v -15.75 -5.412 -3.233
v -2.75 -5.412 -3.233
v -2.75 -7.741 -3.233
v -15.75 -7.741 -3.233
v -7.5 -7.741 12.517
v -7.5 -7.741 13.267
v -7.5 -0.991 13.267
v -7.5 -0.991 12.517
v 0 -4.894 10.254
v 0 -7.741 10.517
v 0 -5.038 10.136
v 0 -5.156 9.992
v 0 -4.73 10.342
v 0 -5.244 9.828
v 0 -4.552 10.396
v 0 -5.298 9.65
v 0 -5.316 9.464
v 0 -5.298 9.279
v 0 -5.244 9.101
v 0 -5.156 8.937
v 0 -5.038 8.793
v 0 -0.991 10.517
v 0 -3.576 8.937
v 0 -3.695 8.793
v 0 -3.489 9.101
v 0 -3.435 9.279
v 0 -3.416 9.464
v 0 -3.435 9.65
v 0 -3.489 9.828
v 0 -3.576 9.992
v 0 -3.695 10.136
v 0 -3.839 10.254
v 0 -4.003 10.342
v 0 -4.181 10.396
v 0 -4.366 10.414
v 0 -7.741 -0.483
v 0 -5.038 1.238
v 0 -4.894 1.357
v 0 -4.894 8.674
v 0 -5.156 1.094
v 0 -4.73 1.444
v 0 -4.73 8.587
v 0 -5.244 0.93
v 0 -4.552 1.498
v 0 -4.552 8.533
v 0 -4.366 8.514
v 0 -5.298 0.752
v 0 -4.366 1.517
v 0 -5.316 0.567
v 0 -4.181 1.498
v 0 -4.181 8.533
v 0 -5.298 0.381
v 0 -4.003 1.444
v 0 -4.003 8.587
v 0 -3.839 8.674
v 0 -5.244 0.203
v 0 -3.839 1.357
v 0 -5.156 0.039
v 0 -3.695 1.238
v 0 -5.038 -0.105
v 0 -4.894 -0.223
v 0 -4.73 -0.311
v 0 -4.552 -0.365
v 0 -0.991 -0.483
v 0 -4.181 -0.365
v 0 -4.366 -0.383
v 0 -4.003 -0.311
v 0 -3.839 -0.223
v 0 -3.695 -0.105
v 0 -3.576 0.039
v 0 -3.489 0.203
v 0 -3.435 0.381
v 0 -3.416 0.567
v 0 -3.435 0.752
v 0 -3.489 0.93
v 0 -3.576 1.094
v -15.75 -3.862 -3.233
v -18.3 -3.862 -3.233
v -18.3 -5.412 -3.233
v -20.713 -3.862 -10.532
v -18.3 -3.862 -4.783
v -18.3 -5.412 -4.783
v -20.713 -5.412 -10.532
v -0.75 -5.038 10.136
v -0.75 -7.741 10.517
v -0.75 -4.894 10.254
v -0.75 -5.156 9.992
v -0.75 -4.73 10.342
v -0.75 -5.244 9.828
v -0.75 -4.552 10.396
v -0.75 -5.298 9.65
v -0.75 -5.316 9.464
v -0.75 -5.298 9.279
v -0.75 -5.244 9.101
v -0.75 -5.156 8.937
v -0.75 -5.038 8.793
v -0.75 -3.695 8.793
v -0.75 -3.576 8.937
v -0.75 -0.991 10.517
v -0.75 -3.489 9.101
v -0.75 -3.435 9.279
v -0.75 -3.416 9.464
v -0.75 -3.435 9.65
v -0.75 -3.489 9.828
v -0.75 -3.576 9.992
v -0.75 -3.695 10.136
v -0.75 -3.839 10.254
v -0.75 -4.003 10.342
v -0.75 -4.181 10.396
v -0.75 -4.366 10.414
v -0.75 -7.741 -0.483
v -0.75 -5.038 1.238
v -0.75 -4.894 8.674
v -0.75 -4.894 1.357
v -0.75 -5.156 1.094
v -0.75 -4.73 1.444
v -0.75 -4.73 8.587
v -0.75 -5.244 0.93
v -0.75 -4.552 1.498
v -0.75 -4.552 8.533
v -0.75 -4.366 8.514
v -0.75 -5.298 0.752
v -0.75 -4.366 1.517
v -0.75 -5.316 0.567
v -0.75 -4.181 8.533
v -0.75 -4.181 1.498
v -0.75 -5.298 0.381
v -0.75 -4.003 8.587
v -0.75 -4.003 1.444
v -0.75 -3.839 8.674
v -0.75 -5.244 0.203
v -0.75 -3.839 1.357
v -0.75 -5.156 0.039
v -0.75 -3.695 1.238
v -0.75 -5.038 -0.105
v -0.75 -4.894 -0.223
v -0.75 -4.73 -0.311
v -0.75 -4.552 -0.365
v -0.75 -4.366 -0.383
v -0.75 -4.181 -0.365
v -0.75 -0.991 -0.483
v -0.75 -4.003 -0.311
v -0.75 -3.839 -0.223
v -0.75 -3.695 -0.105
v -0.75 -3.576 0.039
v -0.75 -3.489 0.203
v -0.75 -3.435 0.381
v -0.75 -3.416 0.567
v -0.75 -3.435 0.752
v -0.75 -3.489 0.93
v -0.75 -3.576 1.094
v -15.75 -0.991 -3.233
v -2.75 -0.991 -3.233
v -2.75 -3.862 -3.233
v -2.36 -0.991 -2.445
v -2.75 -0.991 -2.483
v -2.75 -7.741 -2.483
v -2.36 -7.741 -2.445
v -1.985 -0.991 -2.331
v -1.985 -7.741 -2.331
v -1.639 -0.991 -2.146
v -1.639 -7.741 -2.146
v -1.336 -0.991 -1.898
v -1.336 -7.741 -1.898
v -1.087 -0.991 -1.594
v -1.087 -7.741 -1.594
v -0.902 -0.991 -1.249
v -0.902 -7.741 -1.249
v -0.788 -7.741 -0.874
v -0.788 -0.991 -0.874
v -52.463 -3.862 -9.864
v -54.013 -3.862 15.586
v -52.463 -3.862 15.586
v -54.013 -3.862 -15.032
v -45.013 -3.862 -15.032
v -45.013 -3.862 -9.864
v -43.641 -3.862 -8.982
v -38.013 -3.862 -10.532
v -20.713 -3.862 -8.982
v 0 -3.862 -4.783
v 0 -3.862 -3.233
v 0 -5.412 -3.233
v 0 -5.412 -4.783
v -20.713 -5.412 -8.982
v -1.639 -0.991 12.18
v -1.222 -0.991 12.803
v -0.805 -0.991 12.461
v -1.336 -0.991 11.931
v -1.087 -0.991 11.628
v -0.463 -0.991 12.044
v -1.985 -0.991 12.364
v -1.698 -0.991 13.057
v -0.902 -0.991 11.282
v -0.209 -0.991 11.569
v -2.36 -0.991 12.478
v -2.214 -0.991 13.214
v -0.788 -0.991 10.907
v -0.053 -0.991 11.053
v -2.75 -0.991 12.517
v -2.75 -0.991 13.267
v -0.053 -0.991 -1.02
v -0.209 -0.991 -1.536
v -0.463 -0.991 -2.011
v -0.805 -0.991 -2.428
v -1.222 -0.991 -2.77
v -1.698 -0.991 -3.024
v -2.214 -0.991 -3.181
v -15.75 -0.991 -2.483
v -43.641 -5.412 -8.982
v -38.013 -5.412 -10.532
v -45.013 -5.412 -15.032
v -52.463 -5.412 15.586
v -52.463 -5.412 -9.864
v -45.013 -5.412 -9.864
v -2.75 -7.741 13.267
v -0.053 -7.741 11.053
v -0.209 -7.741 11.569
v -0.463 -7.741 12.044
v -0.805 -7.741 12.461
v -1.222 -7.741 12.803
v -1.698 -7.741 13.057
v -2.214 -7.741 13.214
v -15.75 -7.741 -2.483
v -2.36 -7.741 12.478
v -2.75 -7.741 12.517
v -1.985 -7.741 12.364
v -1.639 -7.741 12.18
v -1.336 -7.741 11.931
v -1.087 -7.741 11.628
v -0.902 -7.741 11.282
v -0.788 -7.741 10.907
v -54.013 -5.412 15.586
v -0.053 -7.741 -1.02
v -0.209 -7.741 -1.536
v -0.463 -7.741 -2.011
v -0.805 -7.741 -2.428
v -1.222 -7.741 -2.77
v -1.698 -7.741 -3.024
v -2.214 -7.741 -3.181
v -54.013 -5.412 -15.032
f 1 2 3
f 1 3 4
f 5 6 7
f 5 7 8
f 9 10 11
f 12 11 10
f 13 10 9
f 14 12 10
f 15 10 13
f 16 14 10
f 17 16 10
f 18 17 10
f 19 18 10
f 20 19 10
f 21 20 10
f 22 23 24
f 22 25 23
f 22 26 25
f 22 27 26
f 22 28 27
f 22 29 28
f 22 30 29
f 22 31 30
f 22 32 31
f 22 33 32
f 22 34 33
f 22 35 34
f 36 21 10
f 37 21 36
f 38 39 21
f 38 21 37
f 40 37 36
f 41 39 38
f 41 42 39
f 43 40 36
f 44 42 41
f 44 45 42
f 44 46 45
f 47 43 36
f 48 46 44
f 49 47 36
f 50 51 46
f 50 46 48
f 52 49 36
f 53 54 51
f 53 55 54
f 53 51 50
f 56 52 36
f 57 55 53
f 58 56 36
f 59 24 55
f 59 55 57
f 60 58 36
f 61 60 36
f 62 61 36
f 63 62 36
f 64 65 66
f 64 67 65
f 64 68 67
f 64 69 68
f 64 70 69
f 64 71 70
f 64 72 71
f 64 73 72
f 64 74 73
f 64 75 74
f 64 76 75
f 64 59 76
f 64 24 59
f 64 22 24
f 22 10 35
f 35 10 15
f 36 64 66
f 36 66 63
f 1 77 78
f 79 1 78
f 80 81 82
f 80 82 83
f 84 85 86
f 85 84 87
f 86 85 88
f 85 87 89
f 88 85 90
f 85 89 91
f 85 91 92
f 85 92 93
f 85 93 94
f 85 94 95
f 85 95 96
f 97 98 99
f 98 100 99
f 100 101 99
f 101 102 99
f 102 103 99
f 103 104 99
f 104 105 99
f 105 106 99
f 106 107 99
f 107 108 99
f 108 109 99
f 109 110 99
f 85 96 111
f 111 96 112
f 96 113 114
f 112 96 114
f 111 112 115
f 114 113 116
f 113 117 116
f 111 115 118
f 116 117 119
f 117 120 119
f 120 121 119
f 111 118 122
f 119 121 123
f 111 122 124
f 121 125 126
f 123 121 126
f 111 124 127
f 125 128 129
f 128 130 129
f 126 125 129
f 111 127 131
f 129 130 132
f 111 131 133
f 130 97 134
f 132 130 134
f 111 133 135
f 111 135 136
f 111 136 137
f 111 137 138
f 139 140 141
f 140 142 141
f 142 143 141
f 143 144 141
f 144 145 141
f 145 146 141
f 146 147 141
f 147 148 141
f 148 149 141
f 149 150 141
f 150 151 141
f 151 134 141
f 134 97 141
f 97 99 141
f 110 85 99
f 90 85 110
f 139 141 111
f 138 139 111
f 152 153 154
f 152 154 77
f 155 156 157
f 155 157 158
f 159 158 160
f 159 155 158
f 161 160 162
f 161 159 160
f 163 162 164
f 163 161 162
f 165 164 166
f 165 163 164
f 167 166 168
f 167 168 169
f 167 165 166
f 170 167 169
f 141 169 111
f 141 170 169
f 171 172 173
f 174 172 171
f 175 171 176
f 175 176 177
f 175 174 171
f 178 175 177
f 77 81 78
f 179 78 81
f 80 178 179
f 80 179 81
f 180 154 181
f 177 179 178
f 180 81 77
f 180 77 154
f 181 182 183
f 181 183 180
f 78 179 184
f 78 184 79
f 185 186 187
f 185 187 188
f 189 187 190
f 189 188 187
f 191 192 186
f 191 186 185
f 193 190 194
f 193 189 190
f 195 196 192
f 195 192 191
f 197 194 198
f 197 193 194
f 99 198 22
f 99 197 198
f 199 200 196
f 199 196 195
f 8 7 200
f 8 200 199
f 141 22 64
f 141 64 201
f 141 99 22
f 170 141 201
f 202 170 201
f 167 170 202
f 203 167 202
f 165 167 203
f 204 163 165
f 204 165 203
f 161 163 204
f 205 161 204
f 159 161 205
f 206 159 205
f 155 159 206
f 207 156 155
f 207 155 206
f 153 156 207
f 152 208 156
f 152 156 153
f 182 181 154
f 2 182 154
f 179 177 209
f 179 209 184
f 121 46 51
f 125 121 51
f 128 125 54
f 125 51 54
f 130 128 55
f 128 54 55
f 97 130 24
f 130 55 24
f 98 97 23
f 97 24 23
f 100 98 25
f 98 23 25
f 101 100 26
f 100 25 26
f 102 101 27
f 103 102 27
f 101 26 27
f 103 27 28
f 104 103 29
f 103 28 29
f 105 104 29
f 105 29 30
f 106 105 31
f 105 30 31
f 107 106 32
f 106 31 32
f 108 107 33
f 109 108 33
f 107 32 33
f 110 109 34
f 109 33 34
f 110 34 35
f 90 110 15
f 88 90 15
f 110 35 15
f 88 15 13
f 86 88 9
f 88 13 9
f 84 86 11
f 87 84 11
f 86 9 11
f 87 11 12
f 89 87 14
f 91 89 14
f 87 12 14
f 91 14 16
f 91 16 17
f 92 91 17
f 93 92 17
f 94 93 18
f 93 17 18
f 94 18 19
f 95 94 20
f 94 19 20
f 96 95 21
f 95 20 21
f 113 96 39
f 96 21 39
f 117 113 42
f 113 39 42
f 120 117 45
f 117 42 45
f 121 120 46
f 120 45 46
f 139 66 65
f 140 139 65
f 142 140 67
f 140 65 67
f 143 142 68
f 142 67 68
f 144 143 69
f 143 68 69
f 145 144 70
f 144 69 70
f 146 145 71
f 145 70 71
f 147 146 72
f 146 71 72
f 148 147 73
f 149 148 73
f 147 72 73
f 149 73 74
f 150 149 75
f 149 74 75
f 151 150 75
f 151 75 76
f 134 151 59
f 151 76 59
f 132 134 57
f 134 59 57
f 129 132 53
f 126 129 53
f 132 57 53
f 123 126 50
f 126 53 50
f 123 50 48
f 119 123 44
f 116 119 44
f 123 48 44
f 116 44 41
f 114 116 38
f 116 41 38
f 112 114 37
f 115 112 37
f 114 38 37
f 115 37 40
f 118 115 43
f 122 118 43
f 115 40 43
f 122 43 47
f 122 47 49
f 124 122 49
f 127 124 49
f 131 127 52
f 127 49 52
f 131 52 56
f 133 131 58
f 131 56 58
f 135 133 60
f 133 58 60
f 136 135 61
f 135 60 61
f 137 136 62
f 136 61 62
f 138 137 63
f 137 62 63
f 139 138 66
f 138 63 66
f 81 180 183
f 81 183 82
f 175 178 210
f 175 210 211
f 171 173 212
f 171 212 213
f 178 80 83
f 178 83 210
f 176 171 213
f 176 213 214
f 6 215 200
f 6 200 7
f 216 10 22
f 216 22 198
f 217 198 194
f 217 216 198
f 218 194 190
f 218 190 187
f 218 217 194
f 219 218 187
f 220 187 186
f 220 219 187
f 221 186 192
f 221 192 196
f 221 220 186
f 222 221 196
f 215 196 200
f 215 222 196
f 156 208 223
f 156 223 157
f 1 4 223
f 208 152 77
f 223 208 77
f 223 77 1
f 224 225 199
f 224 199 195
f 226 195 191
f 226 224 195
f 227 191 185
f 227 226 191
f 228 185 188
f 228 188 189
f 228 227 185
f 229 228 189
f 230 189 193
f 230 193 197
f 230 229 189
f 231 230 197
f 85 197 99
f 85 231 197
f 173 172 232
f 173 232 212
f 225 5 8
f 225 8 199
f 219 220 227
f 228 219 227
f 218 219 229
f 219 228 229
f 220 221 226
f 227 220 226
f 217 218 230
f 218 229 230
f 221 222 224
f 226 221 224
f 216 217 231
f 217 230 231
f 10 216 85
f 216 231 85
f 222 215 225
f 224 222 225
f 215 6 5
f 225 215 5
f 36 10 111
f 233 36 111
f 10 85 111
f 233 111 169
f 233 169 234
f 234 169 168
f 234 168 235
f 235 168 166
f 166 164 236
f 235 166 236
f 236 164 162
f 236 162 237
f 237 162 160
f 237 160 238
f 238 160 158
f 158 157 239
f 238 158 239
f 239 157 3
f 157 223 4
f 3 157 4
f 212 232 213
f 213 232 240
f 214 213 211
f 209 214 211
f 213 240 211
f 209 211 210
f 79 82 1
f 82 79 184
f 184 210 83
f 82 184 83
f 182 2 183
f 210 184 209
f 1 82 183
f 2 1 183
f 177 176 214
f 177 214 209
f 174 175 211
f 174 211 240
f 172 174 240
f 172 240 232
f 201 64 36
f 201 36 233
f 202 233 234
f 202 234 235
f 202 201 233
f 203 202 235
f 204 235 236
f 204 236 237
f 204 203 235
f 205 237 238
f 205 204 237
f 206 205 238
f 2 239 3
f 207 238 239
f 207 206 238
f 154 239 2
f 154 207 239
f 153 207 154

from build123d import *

# Parameters (mm, degrees)
SZKIC2_W                           = 16.5
SZKIC2_H                           = 6.75
ODGI_CIE_BAZOWE1_DEPTH             = 0.75
ODGI_CIE_KRAW_DZI1_STRIP_W         = 7
ODGI_CIE_KRAW_DZI1_STRIP_H         = 0.75
ODGI_CIE_KRAW_DZI1_STRIP_CUT_DEPTH = 6.75
ODGI_CIE_KRAW_DZI1_DEPTH           = 6.75
ODGI_CIE_KRAW_DZI2_STRIP_W         = 7
ODGI_CIE_KRAW_DZI2_STRIP_H         = 0.75
ODGI_CIE_KRAW_DZI2_STRIP_CUT_DEPTH = 6.75
ODGI_CIE_KRAW_DZI2_DEPTH           = 6.75
SZKIC16_W                          = 18.3
SZKIC16_H                          = 1.55
DODANIE_WYCI_GNI_CIE2_DEPTH        = 1.55
DODANIE_WYCI_GNI_CIE3_DEPTH        = 1.55
SZKIC19_R                          = 0.95
WYTNIJ_WYCI_GNI_CIE1_DEPTH         = 0.75


# Sheet-metal steps are written as plain solids
with BuildPart() as part:
    # Szkic2 → Odgięcie bazowe1 (new body)
    with BuildSketch(Plane(origin=(0, 0, 0), x_dir=(0, 0, -1), z_dir=(1, 0, 0))):
        with Locations((-5.0166528, -4.366319951)):
            Rectangle(SZKIC2_W, SZKIC2_H)
    extrude(amount=-ODGI_CIE_BAZOWE1_DEPTH)

    # Odgięcie krawędzi1 strip (across the edge) → Odgięcie krawędzi1 strip cut (cut)
    with BuildSketch(Plane(origin=(-0.75, -7.741319951, 13.2666528), x_dir=(0, 0, -1), z_dir=(0, 1, 0))):
        with Locations((-0.75, -0.375)):
            Rectangle(ODGI_CIE_KRAW_DZI1_STRIP_W, ODGI_CIE_KRAW_DZI1_STRIP_H)
    extrude(amount=ODGI_CIE_KRAW_DZI1_STRIP_CUT_DEPTH, mode=Mode.SUBTRACT)

    # Odgięcie krawędzi1 section (across the edge) → Odgięcie krawędzi1 (add)
    with BuildSketch(Plane(origin=(-0.75, -7.741319951, 13.2666528), x_dir=(0, 0, -1), z_dir=(0, 1, 0))):
        with BuildLine():
            Line((0, 2), (0, 6.75))
            Line((0, 6.75), (0.75, 6.75))
            Line((0.75, 6.75), (0.75, 2))
            ThreePointArc((0.75, 2), (1.335786438, 0.585786438), (2.75, 0))
            Line((2.75, 0), (2.75, -0.75))
            ThreePointArc((2.75, -0.75), (0.805456352, 0.055456352), (0, 2))
        make_face()
    extrude(amount=ODGI_CIE_KRAW_DZI1_DEPTH)

    # Odgięcie krawędzi2 strip (across the edge) → Odgięcie krawędzi2 strip cut (cut)
    with BuildSketch(Plane(origin=(-0.75, -0.991319951, -3.2333472), x_dir=(0, 0, 1), z_dir=(0, -1, 0))):
        with Locations((-0.75, -0.375)):
            Rectangle(ODGI_CIE_KRAW_DZI2_STRIP_W, ODGI_CIE_KRAW_DZI2_STRIP_H)
    extrude(amount=ODGI_CIE_KRAW_DZI2_STRIP_CUT_DEPTH, mode=Mode.SUBTRACT)

    # Odgięcie krawędzi2 section (across the edge) → Odgięcie krawędzi2 (add)
    with BuildSketch(Plane(origin=(-0.75, -0.991319951, -3.2333472), x_dir=(0, 0, 1), z_dir=(0, -1, 0))):
        with BuildLine():
            Line((0, 2), (0, 15))
            Line((0, 15), (0.75, 15))
            Line((0.75, 15), (0.75, 2))
            ThreePointArc((0.75, 2), (1.335786438, 0.585786438), (2.75, 0))
            Line((2.75, 0), (2.75, -0.75))
            ThreePointArc((2.75, -0.75), (0.805456352, 0.055456352), (0, 2))
        make_face()
    extrude(amount=ODGI_CIE_KRAW_DZI2_DEPTH)

    # Szkic16 → Dodanie-wyciągnięcie2 (add)
    with BuildSketch(Plane(origin=(0, 0, -3.2333472), x_dir=(-1, 0, 0), z_dir=(0, 0, -1))):
        with Locations((9.15, -4.636679938)):
            Rectangle(SZKIC16_W, SZKIC16_H)
    extrude(amount=DODANIE_WYCI_GNI_CIE2_DEPTH)

    # Szkic18 → Dodanie-wyciągnięcie3 (add)
    with BuildSketch(Plane(origin=(0, -3.861679938, 0), x_dir=(1, 0, 0), z_dir=(0, 1, 0))):
        Polygon((-45.013147785, 15.032481597), (-54.013147785, 15.032481597), (-54.013147785, -15.585696439), (-52.463147785, -15.585696439), (-52.463147785, 9.864303561), (-45.013147785, 9.864303561), (-43.64142473, 8.982481597), (-20.713147785, 8.982481597), (-18.3, 3.2333472), (-18.3, 4.7833472), (-20.713147785, 10.532481597), (-38.013147785, 10.532481597), align=None)
    extrude(amount=-DODANIE_WYCI_GNI_CIE3_DEPTH)

    # Szkic19 → Wytnij-wyciągnięcie1 (cut)
    with BuildSketch(Plane(origin=(0, 0, 0), x_dir=(0, 0, -1), z_dir=(1, 0, 0))):
        with Locations((-0.5666528, -4.366319951)):
            Circle(SZKIC19_R)
        with Locations((-9.464367913, -4.366319951)):
            Circle(SZKIC19_R)
    extrude(amount=-WYTNIJ_WYCI_GNI_CIE1_DEPTH, mode=Mode.SUBTRACT)


solid = part.part
